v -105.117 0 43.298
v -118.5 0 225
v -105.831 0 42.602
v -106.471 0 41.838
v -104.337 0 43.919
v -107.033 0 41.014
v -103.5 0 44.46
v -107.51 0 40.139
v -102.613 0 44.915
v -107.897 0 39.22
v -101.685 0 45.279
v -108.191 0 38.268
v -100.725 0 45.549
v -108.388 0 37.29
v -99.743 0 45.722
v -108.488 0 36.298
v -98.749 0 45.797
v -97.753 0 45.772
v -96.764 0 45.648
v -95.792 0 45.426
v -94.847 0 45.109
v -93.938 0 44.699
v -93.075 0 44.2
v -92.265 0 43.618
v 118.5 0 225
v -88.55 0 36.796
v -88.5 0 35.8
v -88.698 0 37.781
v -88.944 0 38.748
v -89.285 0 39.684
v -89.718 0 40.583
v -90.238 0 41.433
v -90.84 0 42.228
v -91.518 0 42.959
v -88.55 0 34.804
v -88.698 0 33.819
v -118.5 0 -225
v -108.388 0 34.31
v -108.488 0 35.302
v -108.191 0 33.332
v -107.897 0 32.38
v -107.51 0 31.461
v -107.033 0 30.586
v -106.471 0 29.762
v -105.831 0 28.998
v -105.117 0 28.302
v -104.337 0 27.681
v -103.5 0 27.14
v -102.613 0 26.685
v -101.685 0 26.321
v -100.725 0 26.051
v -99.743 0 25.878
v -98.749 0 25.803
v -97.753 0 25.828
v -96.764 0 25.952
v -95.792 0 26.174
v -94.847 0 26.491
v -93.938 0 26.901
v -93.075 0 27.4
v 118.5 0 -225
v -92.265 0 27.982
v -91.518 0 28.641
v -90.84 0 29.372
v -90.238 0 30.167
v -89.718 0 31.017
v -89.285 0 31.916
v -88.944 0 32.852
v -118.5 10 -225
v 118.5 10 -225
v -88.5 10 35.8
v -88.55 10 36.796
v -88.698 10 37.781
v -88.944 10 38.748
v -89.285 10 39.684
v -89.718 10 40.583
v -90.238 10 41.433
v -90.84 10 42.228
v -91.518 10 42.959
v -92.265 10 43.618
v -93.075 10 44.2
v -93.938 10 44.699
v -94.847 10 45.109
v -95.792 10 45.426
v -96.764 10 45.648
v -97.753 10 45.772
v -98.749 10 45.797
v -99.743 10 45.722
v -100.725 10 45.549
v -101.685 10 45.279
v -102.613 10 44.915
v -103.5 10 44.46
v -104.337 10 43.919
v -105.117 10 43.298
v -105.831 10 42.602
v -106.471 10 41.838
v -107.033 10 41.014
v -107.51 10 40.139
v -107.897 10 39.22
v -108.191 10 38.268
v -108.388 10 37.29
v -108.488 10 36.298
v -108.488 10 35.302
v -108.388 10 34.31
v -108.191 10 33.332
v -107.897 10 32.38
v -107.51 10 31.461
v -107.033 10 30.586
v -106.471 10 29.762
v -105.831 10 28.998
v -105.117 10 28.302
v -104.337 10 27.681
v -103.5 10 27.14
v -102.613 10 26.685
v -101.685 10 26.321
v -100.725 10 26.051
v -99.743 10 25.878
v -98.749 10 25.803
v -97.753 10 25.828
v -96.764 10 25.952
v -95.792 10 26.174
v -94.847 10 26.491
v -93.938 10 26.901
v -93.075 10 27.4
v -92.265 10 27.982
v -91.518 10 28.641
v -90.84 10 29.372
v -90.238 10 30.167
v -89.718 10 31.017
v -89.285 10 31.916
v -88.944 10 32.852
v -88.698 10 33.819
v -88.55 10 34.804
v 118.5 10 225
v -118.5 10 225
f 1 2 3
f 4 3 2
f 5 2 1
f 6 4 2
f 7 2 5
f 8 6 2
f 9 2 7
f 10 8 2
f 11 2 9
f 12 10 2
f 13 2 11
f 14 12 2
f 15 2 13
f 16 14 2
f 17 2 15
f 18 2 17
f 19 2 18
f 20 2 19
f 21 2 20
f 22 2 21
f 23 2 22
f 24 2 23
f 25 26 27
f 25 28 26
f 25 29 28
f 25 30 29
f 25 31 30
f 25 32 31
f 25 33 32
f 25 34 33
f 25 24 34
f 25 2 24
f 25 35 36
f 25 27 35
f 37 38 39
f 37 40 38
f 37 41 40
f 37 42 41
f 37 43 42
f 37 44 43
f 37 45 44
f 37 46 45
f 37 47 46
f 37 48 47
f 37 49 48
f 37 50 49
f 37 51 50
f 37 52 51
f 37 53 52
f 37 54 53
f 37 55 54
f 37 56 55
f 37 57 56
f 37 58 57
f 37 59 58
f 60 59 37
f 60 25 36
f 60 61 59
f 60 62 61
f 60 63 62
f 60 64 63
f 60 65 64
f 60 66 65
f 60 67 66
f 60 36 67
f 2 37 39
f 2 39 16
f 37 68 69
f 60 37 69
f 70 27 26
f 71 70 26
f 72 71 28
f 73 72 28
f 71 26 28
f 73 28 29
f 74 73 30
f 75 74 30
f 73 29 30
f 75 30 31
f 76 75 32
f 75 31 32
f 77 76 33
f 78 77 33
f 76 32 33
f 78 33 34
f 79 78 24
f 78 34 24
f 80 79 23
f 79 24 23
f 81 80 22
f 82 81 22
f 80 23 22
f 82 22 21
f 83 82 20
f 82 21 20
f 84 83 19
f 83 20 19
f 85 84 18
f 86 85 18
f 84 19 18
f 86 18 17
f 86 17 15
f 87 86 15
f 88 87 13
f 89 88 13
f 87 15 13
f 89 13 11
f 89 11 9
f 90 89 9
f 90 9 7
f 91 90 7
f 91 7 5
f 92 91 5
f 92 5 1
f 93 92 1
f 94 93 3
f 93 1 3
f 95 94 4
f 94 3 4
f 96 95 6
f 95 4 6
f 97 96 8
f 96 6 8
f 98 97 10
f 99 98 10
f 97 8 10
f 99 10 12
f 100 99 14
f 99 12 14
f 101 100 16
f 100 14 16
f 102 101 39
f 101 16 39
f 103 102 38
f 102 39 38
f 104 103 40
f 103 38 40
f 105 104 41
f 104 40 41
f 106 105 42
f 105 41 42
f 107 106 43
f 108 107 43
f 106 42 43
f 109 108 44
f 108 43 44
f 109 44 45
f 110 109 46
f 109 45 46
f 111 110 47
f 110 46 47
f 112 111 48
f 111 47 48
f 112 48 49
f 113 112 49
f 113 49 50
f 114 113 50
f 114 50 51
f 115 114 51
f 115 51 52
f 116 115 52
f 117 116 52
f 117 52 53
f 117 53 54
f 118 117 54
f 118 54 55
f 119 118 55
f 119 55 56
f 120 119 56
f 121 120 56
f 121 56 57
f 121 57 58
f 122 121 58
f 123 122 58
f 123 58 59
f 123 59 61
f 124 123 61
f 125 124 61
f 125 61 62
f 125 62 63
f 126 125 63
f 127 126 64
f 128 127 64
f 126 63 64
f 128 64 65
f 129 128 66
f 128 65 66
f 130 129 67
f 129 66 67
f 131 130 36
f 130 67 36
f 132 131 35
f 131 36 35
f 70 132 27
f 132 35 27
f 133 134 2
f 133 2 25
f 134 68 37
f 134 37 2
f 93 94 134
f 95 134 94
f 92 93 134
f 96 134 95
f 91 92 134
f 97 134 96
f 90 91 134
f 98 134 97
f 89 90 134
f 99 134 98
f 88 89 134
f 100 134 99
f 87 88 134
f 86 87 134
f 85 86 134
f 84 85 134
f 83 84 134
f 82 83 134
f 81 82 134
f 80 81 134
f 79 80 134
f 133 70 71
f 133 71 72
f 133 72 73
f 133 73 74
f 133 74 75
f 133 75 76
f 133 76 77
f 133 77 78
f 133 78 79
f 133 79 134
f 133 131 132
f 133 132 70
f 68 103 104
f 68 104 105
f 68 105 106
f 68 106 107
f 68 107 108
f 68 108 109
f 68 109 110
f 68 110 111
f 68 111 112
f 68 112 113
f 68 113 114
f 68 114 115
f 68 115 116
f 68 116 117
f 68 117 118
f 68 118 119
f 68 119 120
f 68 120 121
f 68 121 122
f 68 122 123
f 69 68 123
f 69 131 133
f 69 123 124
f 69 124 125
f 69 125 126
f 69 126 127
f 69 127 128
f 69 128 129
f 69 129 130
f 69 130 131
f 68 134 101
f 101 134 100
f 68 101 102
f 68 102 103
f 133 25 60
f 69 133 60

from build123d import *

# Parameters (mm, degrees)
CROQUIS1_W              = 237
CROQUIS1_H              = 450
SALIENTE_EXTRUIR1_DEPTH = 10
CROQUIS2_W              = 5
CROQUIS2_H              = 450
SALIENTE_EXTRUIR2_DEPTH = 70
CROQUIS3_R              = 2
CORTAR_EXTRUIR1_DEPTH   = 70
CROQUIS4_W              = 450
CROQUIS4_H              = 70
CORTAR_EXTRUIR2_DEPTH   = 10
CROQUIS5_R              = 10
CORTAR_EXTRUIR4_DEPTH   = 10


with BuildPart() as part:
    # Croquis1 → Saliente-Extruir1 (new body)
    with BuildSketch(Plane(origin=(0, 0, 0), x_dir=(1, 0, 0), z_dir=(0, 1, 0))):
        Rectangle(CROQUIS1_W, CROQUIS1_H)
    extrude(amount=SALIENTE_EXTRUIR1_DEPTH)

    # Croquis2 → Saliente-Extruir2 (add)
    with BuildSketch(Plane.XZ):
        with Locations((-116, 0)):
            Rectangle(CROQUIS2_W, CROQUIS2_H)
    extrude(amount=SALIENTE_EXTRUIR2_DEPTH)

    # Croquis3 → Cortar-Extruir1 (cut)
    with BuildSketch(Plane(origin=(-113.5, 0, 0), x_dir=(0, 0, -1), z_dir=(1, 0, 0))):
        with Locations((-215, -10)):
            Circle(CROQUIS3_R)
        with Locations((215, -10)):
            Circle(CROQUIS3_R)
        with Locations((215, -60)):
            Circle(CROQUIS3_R)
        with Locations((-215, -60)):
            Circle(CROQUIS3_R)
    extrude(amount=-CORTAR_EXTRUIR1_DEPTH, mode=Mode.SUBTRACT)

    # Croquis4 → Cortar-Extruir2 (cut)
    with BuildSketch(Plane(origin=(-113.5, 0, 0), x_dir=(0, 0, -1), z_dir=(1, 0, 0))):
        with Locations((0, -35)):
            Rectangle(CROQUIS4_W, CROQUIS4_H)
    extrude(amount=-CORTAR_EXTRUIR2_DEPTH, mode=Mode.SUBTRACT)

    # Croquis5 → Cortar-Extruir4 (cut)
    with BuildSketch(Plane.XZ):
        with Locations((-98.5, 35.8)):
            Circle(CROQUIS5_R)
    extrude(amount=-CORTAR_EXTRUIR4_DEPTH, mode=Mode.SUBTRACT)


solid = part.part
